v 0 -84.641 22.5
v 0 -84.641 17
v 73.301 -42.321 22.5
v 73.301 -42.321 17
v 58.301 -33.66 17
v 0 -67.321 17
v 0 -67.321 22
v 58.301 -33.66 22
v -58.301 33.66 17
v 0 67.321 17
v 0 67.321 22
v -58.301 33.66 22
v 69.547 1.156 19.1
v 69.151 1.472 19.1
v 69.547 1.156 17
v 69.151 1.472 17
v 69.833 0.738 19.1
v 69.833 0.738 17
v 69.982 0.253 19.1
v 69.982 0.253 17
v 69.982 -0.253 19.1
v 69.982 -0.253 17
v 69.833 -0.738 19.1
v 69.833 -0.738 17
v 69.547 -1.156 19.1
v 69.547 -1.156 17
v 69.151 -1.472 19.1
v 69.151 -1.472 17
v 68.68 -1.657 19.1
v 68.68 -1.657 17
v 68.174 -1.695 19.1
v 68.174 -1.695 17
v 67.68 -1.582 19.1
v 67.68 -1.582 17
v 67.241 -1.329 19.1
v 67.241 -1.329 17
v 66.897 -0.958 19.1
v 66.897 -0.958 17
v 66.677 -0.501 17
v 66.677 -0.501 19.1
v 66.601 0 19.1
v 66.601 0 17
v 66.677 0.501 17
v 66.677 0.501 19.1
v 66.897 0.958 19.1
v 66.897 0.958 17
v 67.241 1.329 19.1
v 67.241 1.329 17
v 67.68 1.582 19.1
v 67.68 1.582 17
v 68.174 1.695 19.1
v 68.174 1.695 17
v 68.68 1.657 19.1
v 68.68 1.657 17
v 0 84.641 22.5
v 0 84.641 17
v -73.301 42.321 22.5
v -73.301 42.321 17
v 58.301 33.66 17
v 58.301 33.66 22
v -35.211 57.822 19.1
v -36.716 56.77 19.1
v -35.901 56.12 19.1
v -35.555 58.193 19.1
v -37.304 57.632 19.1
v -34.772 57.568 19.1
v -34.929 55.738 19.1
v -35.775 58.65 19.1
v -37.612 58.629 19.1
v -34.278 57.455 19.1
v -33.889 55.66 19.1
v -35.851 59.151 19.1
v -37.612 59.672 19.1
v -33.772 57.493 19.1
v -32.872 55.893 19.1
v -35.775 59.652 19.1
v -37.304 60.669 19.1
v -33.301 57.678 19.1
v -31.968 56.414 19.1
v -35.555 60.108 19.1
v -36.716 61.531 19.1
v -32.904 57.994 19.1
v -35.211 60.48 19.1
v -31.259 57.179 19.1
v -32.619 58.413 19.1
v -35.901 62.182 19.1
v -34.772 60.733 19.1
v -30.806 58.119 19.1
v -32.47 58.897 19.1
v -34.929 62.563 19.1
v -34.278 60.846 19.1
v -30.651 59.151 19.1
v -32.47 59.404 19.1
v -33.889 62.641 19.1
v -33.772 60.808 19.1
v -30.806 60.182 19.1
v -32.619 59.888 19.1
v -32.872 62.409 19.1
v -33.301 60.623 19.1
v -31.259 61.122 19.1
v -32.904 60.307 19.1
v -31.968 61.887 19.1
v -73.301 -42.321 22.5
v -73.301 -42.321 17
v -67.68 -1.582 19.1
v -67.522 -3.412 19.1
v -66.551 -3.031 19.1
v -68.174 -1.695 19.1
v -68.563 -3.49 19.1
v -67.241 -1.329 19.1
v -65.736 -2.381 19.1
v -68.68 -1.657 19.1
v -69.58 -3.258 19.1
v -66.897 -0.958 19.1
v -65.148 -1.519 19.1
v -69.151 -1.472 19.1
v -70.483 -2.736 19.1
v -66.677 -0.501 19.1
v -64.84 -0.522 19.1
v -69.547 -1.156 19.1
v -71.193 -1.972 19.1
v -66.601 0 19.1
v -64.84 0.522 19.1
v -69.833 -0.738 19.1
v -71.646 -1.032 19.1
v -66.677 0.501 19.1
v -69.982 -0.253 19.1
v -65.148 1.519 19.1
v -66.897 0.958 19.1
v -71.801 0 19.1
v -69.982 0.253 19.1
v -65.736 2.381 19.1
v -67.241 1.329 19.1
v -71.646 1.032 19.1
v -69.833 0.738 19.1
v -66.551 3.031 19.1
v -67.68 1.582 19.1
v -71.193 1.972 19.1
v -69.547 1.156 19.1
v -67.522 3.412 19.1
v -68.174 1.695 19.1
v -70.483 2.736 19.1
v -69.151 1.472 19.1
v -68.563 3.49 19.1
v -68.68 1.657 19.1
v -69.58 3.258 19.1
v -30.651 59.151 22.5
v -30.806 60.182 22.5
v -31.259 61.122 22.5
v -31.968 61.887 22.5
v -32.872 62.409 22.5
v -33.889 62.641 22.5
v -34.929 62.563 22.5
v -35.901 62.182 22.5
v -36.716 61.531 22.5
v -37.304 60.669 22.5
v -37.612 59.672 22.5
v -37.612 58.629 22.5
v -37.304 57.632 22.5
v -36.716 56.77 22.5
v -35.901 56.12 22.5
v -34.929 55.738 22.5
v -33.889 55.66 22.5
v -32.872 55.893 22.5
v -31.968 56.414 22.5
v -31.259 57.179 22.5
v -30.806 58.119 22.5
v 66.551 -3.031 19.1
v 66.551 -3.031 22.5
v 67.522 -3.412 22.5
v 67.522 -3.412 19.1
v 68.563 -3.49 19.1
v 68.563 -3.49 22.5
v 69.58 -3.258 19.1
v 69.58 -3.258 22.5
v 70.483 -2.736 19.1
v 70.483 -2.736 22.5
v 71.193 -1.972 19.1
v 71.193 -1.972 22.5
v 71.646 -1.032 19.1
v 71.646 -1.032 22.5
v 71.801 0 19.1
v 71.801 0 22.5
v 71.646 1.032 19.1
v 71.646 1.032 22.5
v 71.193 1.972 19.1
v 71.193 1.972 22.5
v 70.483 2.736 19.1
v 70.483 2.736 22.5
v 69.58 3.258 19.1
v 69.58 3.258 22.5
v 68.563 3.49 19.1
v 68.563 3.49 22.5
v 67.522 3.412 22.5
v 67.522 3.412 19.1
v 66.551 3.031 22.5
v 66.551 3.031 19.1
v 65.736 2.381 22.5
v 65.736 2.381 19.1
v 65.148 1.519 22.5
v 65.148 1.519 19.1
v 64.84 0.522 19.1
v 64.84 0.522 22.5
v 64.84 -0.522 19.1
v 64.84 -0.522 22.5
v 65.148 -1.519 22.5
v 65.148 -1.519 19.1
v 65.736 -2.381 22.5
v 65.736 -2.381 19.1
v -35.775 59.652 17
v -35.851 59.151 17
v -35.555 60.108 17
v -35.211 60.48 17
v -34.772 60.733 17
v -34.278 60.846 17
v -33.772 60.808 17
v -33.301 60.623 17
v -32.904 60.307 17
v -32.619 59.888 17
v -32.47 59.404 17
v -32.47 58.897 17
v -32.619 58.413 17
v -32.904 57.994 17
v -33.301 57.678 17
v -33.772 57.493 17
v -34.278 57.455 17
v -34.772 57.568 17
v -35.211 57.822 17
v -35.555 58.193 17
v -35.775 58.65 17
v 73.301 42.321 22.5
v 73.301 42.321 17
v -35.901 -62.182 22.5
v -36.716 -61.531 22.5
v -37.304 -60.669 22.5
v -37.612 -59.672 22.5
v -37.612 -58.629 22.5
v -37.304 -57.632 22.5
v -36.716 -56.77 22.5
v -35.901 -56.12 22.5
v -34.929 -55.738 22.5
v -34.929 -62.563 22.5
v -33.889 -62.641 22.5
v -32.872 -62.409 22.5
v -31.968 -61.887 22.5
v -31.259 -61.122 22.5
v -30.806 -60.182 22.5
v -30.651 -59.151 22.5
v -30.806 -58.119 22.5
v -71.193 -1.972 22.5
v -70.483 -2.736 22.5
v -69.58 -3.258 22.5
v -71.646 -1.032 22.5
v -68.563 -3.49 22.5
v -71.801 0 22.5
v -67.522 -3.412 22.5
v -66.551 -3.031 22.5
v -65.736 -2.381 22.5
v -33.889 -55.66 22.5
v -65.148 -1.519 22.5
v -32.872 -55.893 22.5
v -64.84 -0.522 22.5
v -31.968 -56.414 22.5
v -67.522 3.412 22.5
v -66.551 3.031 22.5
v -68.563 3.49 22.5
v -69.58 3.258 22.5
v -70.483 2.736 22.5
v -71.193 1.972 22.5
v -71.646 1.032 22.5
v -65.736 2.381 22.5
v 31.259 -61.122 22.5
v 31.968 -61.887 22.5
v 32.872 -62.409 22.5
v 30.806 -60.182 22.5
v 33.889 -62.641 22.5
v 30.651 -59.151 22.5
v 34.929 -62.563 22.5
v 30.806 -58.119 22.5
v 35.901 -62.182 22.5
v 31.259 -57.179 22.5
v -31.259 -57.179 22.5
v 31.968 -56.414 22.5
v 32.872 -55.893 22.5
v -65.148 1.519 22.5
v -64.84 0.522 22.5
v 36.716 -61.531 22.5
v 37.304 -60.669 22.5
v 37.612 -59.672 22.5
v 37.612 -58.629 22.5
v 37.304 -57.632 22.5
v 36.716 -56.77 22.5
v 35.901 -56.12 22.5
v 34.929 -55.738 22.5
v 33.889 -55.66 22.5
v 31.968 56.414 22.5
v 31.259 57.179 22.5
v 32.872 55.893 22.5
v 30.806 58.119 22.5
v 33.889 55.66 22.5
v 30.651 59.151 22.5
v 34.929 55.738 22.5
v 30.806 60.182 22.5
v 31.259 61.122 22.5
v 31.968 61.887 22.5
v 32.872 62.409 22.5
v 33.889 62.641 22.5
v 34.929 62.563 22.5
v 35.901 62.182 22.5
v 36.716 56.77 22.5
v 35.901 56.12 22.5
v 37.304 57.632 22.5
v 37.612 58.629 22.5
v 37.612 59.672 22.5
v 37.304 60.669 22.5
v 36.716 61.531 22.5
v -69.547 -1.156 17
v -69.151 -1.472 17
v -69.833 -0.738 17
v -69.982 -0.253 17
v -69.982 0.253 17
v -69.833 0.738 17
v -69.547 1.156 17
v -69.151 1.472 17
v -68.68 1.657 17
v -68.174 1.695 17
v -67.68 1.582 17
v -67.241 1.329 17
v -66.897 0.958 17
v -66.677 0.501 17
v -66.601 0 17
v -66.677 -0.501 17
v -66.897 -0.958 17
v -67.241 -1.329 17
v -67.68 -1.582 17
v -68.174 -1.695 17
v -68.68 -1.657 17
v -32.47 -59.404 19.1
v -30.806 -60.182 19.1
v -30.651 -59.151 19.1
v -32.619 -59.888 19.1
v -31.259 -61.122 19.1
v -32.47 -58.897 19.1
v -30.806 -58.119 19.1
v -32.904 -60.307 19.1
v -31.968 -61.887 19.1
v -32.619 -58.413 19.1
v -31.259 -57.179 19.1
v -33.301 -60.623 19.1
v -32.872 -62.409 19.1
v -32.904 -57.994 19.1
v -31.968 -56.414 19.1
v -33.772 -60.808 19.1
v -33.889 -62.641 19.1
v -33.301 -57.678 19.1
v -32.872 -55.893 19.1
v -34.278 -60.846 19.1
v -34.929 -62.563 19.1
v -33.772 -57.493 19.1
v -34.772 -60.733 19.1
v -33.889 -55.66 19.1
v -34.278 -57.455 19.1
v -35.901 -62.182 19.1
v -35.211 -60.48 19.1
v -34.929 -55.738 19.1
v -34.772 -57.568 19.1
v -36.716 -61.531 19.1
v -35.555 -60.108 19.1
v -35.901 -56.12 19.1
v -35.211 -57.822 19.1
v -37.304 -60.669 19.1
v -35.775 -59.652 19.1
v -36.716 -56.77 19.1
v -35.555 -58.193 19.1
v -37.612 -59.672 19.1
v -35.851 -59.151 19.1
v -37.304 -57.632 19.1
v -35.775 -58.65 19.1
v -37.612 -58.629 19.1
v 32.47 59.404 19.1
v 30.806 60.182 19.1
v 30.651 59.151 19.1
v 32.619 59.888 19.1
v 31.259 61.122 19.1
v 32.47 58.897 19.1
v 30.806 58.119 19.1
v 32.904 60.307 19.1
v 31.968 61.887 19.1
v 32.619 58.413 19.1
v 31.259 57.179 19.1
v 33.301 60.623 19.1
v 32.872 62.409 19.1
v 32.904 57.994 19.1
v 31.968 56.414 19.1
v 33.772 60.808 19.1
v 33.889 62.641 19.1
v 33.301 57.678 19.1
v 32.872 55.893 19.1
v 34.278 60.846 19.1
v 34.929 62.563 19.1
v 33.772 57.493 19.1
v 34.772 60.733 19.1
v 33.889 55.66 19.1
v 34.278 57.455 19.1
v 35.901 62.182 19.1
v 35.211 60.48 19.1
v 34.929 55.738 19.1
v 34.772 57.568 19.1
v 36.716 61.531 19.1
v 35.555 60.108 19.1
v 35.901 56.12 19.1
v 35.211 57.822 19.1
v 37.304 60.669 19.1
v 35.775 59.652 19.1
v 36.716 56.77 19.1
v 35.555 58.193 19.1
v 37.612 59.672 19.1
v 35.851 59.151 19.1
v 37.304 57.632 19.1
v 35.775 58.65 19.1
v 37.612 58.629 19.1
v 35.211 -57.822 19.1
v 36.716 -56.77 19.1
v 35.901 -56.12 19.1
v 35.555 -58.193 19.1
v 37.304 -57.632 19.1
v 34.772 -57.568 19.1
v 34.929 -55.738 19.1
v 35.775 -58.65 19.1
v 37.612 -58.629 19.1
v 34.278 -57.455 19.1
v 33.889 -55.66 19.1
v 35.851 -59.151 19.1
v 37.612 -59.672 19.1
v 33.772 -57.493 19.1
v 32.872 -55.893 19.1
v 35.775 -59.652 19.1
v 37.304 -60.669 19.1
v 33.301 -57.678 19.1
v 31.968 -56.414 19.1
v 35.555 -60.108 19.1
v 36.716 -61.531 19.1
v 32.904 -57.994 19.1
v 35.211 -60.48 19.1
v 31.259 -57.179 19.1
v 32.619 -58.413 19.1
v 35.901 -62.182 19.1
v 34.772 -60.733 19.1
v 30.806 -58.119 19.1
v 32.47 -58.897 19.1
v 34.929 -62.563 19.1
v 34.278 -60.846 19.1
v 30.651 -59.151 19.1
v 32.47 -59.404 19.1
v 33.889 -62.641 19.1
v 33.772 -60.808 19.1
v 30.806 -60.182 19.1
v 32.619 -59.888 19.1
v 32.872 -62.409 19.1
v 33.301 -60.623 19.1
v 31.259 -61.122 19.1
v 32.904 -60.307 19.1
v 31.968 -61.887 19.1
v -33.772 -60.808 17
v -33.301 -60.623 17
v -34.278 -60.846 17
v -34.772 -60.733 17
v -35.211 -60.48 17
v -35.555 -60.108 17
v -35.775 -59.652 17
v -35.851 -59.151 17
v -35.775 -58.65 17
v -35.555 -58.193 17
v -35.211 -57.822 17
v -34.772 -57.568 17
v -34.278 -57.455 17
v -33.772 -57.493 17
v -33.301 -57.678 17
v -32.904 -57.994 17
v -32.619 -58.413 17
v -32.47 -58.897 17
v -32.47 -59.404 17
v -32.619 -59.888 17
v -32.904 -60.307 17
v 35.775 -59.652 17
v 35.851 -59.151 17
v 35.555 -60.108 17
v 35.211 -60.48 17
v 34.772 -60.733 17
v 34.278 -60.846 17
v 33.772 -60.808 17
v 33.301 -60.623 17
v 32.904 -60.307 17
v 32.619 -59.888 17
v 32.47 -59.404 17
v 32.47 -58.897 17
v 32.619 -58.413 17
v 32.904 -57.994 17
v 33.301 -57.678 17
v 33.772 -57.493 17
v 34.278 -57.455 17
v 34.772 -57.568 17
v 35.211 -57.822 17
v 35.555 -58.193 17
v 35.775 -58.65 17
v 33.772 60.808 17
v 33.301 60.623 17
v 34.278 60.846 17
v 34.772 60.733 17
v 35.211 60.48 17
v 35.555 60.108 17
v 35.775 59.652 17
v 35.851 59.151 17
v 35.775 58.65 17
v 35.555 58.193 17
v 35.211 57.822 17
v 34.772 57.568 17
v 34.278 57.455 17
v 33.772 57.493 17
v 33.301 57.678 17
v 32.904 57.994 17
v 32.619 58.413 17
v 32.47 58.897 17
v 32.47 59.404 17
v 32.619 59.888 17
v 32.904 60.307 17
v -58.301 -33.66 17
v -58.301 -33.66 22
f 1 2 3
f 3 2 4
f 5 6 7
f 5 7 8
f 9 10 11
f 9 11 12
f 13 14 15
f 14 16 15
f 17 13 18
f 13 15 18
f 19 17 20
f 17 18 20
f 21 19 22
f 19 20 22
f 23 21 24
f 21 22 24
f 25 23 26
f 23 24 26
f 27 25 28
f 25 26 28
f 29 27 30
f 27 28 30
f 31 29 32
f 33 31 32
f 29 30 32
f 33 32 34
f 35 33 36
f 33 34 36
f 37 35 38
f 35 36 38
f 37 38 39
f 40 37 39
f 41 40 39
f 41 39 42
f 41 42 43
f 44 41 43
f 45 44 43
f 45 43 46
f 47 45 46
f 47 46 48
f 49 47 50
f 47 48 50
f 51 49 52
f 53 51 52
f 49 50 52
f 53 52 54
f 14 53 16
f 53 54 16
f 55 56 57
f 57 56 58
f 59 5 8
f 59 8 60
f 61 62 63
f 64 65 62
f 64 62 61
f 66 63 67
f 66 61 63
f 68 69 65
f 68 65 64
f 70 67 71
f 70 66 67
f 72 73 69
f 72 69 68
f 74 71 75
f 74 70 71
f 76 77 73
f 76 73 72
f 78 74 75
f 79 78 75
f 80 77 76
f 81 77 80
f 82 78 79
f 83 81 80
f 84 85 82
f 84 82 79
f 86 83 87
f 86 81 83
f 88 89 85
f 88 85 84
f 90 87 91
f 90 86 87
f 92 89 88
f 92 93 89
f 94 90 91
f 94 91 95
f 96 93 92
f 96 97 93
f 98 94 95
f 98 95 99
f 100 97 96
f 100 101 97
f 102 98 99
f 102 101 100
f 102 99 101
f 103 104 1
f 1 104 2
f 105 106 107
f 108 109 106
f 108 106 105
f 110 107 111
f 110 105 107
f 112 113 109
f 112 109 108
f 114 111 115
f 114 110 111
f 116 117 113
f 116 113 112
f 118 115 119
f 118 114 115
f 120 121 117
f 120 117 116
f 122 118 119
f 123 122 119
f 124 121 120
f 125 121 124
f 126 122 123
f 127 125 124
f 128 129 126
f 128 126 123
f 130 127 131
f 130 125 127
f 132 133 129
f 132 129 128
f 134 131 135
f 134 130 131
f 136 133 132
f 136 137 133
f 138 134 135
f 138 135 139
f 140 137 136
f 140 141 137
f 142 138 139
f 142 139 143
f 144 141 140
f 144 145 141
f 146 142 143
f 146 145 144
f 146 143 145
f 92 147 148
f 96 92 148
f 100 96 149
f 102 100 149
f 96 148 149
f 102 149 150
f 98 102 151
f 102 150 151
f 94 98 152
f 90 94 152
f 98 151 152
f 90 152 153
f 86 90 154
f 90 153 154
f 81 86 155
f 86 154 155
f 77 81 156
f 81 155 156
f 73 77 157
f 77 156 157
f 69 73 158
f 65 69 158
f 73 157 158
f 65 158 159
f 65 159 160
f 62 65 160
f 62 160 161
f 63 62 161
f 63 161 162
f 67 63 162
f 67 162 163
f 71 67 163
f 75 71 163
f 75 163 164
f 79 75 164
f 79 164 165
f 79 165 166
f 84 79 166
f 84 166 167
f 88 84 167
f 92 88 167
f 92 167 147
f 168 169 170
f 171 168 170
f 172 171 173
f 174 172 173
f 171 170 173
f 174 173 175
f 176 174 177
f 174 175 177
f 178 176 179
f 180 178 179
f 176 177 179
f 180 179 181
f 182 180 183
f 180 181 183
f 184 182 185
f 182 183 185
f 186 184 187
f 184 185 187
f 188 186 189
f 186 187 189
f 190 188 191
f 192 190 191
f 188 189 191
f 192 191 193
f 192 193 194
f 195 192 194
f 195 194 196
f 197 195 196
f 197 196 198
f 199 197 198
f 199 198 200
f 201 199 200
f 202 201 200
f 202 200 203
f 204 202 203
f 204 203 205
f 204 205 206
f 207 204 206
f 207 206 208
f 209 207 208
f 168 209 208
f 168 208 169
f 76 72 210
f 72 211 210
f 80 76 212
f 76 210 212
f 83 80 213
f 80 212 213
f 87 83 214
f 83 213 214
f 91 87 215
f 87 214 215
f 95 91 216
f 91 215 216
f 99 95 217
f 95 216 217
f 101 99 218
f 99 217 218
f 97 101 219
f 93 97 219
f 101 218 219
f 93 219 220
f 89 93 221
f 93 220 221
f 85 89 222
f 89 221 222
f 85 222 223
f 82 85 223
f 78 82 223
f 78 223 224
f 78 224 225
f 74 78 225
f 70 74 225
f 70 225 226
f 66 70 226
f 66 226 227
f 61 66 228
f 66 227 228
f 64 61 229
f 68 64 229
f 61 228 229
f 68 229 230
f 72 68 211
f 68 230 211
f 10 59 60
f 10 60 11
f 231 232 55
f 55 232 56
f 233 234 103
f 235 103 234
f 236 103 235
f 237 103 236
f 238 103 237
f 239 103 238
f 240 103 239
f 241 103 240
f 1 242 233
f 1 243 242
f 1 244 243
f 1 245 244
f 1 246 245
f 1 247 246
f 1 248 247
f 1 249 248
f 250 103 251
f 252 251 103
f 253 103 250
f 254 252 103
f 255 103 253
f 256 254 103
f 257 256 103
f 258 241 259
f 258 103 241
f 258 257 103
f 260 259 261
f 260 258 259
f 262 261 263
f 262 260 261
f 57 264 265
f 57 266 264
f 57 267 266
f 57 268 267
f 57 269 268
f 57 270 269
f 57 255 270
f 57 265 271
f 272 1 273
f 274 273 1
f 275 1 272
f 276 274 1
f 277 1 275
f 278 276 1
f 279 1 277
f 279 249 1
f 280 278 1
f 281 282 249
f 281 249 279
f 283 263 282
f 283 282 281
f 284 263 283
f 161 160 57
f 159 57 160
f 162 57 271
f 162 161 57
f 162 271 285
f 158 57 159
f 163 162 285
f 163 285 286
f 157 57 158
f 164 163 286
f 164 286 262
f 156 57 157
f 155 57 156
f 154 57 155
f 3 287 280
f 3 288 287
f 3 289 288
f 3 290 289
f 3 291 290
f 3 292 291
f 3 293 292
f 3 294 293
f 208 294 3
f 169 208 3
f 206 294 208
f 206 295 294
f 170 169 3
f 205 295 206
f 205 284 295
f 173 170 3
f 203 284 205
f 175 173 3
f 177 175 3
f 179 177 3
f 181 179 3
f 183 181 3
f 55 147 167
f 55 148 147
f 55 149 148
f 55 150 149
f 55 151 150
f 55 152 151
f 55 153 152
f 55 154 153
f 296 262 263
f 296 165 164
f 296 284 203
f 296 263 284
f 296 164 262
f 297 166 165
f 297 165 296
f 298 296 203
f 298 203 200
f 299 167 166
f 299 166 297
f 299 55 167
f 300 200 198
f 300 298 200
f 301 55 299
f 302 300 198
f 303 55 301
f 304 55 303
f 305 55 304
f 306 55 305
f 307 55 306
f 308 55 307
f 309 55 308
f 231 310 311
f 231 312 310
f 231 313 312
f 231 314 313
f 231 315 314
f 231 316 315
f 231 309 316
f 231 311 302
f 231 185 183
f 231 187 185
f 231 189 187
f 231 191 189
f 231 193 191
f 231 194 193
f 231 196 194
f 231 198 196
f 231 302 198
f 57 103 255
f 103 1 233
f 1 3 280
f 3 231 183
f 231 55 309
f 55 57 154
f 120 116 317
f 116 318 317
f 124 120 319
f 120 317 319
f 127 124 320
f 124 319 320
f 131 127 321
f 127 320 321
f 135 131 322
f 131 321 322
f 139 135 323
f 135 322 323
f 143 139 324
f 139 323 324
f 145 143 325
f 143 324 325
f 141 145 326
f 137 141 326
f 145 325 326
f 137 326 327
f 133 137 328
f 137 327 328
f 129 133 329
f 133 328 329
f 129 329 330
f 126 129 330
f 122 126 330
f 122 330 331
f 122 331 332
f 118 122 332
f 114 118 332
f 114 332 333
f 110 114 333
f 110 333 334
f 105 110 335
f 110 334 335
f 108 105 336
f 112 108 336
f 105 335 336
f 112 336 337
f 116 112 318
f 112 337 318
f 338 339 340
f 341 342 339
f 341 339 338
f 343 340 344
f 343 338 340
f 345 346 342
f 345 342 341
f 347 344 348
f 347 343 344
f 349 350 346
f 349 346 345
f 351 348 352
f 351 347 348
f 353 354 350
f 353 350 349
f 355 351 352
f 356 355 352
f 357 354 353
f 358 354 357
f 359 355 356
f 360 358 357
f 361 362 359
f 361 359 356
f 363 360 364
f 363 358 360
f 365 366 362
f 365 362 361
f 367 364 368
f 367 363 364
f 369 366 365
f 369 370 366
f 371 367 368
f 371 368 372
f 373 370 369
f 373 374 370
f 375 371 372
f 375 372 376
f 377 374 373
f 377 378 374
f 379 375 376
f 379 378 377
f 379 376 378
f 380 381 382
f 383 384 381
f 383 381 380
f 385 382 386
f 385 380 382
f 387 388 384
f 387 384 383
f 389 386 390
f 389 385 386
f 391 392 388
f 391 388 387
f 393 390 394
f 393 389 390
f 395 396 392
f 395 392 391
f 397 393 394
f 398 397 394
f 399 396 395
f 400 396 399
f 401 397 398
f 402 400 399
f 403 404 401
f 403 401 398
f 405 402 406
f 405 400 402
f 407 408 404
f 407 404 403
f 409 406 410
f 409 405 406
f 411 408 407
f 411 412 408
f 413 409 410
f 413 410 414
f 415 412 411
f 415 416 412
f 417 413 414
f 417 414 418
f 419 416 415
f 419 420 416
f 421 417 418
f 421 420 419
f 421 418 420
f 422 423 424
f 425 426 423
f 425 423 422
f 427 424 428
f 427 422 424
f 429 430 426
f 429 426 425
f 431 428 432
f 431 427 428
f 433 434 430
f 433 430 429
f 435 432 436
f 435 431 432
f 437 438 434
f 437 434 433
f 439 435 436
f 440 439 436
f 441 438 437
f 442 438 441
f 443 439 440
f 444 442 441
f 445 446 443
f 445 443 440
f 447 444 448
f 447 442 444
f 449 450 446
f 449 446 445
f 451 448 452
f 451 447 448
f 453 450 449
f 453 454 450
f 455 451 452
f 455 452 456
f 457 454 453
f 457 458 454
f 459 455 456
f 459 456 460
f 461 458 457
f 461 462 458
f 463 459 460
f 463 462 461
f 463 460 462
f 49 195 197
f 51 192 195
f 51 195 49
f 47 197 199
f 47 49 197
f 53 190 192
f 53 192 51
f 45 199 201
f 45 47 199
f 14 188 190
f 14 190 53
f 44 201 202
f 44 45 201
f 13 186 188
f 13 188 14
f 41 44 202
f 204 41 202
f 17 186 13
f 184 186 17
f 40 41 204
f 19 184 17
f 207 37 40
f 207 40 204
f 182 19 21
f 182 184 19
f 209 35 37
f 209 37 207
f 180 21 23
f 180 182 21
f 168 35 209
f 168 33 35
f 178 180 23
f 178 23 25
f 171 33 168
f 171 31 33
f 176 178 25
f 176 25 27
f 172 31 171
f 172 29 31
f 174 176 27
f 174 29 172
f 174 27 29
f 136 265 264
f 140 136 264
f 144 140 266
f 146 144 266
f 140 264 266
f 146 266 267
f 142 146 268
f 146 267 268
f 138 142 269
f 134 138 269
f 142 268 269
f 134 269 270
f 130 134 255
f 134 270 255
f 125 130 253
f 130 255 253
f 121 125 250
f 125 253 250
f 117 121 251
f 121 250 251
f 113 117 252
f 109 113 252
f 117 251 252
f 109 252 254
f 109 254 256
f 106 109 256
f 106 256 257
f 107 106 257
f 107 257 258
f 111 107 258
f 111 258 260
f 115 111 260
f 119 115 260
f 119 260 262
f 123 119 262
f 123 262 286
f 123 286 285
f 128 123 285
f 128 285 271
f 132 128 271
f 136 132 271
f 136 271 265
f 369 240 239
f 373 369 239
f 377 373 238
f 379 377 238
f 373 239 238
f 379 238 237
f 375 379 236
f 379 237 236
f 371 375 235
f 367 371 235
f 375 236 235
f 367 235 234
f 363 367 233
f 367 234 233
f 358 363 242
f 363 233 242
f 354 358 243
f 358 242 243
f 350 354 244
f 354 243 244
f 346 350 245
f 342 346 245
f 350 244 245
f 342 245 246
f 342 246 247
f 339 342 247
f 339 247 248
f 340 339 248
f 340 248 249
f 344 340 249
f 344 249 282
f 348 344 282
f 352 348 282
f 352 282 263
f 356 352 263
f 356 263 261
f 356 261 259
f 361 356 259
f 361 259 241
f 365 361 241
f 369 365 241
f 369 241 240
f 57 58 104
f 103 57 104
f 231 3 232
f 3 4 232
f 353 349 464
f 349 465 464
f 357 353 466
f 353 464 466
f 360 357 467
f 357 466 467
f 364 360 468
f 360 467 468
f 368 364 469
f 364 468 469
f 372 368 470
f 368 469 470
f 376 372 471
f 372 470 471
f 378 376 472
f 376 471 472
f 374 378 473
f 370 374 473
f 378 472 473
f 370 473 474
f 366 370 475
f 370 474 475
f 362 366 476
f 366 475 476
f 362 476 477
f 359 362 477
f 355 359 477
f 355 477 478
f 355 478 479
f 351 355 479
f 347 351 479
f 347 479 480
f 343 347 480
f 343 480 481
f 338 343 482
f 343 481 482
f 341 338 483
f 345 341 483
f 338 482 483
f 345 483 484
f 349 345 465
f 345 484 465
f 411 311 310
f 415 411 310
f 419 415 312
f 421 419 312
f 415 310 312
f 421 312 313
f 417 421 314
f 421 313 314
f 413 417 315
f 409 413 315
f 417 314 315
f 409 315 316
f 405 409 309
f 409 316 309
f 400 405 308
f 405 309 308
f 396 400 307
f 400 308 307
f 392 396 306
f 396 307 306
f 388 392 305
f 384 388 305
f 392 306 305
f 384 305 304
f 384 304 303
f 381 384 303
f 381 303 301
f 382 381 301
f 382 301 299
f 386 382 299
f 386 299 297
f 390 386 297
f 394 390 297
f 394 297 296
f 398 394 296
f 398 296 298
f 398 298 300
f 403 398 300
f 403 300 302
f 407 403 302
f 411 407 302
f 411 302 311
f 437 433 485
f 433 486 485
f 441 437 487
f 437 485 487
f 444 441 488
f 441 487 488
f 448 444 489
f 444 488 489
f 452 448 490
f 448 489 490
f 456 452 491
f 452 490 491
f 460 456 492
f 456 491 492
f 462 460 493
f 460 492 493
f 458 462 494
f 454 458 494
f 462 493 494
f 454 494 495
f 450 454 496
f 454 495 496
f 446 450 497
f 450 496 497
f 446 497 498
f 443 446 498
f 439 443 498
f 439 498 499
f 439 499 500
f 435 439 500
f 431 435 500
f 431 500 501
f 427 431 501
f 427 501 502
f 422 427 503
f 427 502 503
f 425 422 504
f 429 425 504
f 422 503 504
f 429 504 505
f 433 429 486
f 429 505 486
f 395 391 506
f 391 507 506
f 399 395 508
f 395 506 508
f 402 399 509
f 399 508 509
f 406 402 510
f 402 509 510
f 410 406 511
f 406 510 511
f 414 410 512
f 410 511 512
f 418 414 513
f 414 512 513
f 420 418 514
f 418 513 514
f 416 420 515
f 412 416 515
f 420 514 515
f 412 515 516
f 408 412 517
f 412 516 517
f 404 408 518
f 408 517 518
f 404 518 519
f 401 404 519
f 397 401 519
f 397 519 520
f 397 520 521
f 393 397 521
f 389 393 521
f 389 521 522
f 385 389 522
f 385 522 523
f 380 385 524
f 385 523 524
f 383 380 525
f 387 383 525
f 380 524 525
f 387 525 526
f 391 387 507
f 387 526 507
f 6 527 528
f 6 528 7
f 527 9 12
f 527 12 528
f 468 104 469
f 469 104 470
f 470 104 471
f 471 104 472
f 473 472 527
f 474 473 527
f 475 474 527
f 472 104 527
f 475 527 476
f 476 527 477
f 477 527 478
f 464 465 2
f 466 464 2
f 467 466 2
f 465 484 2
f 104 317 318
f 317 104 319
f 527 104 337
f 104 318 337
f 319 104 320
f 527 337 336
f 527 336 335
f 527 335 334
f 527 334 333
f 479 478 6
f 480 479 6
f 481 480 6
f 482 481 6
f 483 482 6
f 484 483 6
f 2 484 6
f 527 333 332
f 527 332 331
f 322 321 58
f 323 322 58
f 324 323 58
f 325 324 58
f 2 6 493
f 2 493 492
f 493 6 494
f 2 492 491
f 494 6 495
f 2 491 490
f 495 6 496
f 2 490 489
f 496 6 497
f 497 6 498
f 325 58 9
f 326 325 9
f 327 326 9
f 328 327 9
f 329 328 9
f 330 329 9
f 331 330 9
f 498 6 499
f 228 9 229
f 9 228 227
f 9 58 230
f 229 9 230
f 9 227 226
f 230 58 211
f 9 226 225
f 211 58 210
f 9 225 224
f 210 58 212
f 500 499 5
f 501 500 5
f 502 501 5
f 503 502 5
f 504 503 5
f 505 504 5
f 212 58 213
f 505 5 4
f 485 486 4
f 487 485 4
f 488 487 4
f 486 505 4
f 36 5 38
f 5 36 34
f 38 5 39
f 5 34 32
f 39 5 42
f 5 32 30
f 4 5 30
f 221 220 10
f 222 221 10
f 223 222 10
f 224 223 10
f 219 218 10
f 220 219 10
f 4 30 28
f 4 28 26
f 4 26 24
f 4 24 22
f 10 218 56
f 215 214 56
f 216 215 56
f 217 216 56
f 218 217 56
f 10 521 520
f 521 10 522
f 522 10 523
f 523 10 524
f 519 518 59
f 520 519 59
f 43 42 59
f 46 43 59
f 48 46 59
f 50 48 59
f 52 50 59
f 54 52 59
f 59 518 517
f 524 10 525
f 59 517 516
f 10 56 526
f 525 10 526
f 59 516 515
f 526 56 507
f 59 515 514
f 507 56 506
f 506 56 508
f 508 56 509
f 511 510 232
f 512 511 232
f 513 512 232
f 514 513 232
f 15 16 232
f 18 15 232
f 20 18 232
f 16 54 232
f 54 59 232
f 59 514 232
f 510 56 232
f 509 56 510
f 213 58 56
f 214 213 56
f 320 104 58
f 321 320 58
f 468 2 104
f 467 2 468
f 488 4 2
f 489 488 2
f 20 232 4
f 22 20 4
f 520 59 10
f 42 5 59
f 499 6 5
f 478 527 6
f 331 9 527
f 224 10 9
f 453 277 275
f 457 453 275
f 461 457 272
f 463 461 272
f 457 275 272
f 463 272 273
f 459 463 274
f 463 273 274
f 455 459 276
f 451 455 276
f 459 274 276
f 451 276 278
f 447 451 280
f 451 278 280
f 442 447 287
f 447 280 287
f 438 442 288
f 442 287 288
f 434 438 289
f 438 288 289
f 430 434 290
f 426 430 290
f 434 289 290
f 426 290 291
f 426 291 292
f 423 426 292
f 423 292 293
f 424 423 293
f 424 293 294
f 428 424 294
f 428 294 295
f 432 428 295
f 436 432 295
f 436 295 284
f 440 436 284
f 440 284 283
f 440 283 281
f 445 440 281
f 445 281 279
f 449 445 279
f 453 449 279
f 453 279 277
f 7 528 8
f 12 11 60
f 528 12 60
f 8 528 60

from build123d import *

# Parameters (mm, degrees)
PAD003_DEPTH       = 5
PAD004_DEPTH       = 0.5
HOLE_D             = 3.4
HOLE_DEPTH         = 25
HOLE_CBORE_D       = 7
HOLE_CBORE_DEPTH   = 3.4
POLARPATTERN_COUNT = 6


with BuildPart() as part:
    # Sketch005 → Pad003 (new body)
    with BuildSketch(Plane.XY):
        Polygon((73.30127, 42.320508), (0, 84.641016), (-73.30127, 42.320508), (-73.30127, -42.320508), (0, -84.641016), (73.30127, -42.320508), align=None)
        Polygon((58.30127, 33.660254), (0, 67.320508), (-58.30127, 33.660254), (-58.30127, -33.660254), (0, -67.320508), (58.30127, -33.660254), align=None, mode=Mode.SUBTRACT)
    extrude(amount=PAD003_DEPTH)

    # Sketch006 (on Face14 of Pad003) → Pad004 (join)
    with BuildSketch(Plane.XY.offset(5)):
        Polygon((-73.30127, 42.320508), (-73.30127, -42.320508), (0, -84.641016), (73.30127, -42.320508), (73.30127, 42.320508), (0, 84.641016), align=None)
    extrude(amount=PAD004_DEPTH)

    # Hole
    with Locations(Plane.XY.offset(5.5)):
        with Locations((-34.150635, 59.150635)):
            hole = CounterBoreHole(HOLE_D / 2, HOLE_CBORE_D / 2, HOLE_CBORE_DEPTH, depth=HOLE_DEPTH)

    # PolarPattern: Hole ×6 about axis
    polarpattern_axis = Axis((0, 0, 0), (0, 0, 1))
    for i in range(1, POLARPATTERN_COUNT):
        add(hole.rotate(polarpattern_axis, i * 360 / POLARPATTERN_COUNT), mode=Mode.SUBTRACT)


with BuildPart() as part_1:
    # Body002 placement: moved
    add(part.part.moved(Location((0, 0, 17))))


solid = part_1.part
